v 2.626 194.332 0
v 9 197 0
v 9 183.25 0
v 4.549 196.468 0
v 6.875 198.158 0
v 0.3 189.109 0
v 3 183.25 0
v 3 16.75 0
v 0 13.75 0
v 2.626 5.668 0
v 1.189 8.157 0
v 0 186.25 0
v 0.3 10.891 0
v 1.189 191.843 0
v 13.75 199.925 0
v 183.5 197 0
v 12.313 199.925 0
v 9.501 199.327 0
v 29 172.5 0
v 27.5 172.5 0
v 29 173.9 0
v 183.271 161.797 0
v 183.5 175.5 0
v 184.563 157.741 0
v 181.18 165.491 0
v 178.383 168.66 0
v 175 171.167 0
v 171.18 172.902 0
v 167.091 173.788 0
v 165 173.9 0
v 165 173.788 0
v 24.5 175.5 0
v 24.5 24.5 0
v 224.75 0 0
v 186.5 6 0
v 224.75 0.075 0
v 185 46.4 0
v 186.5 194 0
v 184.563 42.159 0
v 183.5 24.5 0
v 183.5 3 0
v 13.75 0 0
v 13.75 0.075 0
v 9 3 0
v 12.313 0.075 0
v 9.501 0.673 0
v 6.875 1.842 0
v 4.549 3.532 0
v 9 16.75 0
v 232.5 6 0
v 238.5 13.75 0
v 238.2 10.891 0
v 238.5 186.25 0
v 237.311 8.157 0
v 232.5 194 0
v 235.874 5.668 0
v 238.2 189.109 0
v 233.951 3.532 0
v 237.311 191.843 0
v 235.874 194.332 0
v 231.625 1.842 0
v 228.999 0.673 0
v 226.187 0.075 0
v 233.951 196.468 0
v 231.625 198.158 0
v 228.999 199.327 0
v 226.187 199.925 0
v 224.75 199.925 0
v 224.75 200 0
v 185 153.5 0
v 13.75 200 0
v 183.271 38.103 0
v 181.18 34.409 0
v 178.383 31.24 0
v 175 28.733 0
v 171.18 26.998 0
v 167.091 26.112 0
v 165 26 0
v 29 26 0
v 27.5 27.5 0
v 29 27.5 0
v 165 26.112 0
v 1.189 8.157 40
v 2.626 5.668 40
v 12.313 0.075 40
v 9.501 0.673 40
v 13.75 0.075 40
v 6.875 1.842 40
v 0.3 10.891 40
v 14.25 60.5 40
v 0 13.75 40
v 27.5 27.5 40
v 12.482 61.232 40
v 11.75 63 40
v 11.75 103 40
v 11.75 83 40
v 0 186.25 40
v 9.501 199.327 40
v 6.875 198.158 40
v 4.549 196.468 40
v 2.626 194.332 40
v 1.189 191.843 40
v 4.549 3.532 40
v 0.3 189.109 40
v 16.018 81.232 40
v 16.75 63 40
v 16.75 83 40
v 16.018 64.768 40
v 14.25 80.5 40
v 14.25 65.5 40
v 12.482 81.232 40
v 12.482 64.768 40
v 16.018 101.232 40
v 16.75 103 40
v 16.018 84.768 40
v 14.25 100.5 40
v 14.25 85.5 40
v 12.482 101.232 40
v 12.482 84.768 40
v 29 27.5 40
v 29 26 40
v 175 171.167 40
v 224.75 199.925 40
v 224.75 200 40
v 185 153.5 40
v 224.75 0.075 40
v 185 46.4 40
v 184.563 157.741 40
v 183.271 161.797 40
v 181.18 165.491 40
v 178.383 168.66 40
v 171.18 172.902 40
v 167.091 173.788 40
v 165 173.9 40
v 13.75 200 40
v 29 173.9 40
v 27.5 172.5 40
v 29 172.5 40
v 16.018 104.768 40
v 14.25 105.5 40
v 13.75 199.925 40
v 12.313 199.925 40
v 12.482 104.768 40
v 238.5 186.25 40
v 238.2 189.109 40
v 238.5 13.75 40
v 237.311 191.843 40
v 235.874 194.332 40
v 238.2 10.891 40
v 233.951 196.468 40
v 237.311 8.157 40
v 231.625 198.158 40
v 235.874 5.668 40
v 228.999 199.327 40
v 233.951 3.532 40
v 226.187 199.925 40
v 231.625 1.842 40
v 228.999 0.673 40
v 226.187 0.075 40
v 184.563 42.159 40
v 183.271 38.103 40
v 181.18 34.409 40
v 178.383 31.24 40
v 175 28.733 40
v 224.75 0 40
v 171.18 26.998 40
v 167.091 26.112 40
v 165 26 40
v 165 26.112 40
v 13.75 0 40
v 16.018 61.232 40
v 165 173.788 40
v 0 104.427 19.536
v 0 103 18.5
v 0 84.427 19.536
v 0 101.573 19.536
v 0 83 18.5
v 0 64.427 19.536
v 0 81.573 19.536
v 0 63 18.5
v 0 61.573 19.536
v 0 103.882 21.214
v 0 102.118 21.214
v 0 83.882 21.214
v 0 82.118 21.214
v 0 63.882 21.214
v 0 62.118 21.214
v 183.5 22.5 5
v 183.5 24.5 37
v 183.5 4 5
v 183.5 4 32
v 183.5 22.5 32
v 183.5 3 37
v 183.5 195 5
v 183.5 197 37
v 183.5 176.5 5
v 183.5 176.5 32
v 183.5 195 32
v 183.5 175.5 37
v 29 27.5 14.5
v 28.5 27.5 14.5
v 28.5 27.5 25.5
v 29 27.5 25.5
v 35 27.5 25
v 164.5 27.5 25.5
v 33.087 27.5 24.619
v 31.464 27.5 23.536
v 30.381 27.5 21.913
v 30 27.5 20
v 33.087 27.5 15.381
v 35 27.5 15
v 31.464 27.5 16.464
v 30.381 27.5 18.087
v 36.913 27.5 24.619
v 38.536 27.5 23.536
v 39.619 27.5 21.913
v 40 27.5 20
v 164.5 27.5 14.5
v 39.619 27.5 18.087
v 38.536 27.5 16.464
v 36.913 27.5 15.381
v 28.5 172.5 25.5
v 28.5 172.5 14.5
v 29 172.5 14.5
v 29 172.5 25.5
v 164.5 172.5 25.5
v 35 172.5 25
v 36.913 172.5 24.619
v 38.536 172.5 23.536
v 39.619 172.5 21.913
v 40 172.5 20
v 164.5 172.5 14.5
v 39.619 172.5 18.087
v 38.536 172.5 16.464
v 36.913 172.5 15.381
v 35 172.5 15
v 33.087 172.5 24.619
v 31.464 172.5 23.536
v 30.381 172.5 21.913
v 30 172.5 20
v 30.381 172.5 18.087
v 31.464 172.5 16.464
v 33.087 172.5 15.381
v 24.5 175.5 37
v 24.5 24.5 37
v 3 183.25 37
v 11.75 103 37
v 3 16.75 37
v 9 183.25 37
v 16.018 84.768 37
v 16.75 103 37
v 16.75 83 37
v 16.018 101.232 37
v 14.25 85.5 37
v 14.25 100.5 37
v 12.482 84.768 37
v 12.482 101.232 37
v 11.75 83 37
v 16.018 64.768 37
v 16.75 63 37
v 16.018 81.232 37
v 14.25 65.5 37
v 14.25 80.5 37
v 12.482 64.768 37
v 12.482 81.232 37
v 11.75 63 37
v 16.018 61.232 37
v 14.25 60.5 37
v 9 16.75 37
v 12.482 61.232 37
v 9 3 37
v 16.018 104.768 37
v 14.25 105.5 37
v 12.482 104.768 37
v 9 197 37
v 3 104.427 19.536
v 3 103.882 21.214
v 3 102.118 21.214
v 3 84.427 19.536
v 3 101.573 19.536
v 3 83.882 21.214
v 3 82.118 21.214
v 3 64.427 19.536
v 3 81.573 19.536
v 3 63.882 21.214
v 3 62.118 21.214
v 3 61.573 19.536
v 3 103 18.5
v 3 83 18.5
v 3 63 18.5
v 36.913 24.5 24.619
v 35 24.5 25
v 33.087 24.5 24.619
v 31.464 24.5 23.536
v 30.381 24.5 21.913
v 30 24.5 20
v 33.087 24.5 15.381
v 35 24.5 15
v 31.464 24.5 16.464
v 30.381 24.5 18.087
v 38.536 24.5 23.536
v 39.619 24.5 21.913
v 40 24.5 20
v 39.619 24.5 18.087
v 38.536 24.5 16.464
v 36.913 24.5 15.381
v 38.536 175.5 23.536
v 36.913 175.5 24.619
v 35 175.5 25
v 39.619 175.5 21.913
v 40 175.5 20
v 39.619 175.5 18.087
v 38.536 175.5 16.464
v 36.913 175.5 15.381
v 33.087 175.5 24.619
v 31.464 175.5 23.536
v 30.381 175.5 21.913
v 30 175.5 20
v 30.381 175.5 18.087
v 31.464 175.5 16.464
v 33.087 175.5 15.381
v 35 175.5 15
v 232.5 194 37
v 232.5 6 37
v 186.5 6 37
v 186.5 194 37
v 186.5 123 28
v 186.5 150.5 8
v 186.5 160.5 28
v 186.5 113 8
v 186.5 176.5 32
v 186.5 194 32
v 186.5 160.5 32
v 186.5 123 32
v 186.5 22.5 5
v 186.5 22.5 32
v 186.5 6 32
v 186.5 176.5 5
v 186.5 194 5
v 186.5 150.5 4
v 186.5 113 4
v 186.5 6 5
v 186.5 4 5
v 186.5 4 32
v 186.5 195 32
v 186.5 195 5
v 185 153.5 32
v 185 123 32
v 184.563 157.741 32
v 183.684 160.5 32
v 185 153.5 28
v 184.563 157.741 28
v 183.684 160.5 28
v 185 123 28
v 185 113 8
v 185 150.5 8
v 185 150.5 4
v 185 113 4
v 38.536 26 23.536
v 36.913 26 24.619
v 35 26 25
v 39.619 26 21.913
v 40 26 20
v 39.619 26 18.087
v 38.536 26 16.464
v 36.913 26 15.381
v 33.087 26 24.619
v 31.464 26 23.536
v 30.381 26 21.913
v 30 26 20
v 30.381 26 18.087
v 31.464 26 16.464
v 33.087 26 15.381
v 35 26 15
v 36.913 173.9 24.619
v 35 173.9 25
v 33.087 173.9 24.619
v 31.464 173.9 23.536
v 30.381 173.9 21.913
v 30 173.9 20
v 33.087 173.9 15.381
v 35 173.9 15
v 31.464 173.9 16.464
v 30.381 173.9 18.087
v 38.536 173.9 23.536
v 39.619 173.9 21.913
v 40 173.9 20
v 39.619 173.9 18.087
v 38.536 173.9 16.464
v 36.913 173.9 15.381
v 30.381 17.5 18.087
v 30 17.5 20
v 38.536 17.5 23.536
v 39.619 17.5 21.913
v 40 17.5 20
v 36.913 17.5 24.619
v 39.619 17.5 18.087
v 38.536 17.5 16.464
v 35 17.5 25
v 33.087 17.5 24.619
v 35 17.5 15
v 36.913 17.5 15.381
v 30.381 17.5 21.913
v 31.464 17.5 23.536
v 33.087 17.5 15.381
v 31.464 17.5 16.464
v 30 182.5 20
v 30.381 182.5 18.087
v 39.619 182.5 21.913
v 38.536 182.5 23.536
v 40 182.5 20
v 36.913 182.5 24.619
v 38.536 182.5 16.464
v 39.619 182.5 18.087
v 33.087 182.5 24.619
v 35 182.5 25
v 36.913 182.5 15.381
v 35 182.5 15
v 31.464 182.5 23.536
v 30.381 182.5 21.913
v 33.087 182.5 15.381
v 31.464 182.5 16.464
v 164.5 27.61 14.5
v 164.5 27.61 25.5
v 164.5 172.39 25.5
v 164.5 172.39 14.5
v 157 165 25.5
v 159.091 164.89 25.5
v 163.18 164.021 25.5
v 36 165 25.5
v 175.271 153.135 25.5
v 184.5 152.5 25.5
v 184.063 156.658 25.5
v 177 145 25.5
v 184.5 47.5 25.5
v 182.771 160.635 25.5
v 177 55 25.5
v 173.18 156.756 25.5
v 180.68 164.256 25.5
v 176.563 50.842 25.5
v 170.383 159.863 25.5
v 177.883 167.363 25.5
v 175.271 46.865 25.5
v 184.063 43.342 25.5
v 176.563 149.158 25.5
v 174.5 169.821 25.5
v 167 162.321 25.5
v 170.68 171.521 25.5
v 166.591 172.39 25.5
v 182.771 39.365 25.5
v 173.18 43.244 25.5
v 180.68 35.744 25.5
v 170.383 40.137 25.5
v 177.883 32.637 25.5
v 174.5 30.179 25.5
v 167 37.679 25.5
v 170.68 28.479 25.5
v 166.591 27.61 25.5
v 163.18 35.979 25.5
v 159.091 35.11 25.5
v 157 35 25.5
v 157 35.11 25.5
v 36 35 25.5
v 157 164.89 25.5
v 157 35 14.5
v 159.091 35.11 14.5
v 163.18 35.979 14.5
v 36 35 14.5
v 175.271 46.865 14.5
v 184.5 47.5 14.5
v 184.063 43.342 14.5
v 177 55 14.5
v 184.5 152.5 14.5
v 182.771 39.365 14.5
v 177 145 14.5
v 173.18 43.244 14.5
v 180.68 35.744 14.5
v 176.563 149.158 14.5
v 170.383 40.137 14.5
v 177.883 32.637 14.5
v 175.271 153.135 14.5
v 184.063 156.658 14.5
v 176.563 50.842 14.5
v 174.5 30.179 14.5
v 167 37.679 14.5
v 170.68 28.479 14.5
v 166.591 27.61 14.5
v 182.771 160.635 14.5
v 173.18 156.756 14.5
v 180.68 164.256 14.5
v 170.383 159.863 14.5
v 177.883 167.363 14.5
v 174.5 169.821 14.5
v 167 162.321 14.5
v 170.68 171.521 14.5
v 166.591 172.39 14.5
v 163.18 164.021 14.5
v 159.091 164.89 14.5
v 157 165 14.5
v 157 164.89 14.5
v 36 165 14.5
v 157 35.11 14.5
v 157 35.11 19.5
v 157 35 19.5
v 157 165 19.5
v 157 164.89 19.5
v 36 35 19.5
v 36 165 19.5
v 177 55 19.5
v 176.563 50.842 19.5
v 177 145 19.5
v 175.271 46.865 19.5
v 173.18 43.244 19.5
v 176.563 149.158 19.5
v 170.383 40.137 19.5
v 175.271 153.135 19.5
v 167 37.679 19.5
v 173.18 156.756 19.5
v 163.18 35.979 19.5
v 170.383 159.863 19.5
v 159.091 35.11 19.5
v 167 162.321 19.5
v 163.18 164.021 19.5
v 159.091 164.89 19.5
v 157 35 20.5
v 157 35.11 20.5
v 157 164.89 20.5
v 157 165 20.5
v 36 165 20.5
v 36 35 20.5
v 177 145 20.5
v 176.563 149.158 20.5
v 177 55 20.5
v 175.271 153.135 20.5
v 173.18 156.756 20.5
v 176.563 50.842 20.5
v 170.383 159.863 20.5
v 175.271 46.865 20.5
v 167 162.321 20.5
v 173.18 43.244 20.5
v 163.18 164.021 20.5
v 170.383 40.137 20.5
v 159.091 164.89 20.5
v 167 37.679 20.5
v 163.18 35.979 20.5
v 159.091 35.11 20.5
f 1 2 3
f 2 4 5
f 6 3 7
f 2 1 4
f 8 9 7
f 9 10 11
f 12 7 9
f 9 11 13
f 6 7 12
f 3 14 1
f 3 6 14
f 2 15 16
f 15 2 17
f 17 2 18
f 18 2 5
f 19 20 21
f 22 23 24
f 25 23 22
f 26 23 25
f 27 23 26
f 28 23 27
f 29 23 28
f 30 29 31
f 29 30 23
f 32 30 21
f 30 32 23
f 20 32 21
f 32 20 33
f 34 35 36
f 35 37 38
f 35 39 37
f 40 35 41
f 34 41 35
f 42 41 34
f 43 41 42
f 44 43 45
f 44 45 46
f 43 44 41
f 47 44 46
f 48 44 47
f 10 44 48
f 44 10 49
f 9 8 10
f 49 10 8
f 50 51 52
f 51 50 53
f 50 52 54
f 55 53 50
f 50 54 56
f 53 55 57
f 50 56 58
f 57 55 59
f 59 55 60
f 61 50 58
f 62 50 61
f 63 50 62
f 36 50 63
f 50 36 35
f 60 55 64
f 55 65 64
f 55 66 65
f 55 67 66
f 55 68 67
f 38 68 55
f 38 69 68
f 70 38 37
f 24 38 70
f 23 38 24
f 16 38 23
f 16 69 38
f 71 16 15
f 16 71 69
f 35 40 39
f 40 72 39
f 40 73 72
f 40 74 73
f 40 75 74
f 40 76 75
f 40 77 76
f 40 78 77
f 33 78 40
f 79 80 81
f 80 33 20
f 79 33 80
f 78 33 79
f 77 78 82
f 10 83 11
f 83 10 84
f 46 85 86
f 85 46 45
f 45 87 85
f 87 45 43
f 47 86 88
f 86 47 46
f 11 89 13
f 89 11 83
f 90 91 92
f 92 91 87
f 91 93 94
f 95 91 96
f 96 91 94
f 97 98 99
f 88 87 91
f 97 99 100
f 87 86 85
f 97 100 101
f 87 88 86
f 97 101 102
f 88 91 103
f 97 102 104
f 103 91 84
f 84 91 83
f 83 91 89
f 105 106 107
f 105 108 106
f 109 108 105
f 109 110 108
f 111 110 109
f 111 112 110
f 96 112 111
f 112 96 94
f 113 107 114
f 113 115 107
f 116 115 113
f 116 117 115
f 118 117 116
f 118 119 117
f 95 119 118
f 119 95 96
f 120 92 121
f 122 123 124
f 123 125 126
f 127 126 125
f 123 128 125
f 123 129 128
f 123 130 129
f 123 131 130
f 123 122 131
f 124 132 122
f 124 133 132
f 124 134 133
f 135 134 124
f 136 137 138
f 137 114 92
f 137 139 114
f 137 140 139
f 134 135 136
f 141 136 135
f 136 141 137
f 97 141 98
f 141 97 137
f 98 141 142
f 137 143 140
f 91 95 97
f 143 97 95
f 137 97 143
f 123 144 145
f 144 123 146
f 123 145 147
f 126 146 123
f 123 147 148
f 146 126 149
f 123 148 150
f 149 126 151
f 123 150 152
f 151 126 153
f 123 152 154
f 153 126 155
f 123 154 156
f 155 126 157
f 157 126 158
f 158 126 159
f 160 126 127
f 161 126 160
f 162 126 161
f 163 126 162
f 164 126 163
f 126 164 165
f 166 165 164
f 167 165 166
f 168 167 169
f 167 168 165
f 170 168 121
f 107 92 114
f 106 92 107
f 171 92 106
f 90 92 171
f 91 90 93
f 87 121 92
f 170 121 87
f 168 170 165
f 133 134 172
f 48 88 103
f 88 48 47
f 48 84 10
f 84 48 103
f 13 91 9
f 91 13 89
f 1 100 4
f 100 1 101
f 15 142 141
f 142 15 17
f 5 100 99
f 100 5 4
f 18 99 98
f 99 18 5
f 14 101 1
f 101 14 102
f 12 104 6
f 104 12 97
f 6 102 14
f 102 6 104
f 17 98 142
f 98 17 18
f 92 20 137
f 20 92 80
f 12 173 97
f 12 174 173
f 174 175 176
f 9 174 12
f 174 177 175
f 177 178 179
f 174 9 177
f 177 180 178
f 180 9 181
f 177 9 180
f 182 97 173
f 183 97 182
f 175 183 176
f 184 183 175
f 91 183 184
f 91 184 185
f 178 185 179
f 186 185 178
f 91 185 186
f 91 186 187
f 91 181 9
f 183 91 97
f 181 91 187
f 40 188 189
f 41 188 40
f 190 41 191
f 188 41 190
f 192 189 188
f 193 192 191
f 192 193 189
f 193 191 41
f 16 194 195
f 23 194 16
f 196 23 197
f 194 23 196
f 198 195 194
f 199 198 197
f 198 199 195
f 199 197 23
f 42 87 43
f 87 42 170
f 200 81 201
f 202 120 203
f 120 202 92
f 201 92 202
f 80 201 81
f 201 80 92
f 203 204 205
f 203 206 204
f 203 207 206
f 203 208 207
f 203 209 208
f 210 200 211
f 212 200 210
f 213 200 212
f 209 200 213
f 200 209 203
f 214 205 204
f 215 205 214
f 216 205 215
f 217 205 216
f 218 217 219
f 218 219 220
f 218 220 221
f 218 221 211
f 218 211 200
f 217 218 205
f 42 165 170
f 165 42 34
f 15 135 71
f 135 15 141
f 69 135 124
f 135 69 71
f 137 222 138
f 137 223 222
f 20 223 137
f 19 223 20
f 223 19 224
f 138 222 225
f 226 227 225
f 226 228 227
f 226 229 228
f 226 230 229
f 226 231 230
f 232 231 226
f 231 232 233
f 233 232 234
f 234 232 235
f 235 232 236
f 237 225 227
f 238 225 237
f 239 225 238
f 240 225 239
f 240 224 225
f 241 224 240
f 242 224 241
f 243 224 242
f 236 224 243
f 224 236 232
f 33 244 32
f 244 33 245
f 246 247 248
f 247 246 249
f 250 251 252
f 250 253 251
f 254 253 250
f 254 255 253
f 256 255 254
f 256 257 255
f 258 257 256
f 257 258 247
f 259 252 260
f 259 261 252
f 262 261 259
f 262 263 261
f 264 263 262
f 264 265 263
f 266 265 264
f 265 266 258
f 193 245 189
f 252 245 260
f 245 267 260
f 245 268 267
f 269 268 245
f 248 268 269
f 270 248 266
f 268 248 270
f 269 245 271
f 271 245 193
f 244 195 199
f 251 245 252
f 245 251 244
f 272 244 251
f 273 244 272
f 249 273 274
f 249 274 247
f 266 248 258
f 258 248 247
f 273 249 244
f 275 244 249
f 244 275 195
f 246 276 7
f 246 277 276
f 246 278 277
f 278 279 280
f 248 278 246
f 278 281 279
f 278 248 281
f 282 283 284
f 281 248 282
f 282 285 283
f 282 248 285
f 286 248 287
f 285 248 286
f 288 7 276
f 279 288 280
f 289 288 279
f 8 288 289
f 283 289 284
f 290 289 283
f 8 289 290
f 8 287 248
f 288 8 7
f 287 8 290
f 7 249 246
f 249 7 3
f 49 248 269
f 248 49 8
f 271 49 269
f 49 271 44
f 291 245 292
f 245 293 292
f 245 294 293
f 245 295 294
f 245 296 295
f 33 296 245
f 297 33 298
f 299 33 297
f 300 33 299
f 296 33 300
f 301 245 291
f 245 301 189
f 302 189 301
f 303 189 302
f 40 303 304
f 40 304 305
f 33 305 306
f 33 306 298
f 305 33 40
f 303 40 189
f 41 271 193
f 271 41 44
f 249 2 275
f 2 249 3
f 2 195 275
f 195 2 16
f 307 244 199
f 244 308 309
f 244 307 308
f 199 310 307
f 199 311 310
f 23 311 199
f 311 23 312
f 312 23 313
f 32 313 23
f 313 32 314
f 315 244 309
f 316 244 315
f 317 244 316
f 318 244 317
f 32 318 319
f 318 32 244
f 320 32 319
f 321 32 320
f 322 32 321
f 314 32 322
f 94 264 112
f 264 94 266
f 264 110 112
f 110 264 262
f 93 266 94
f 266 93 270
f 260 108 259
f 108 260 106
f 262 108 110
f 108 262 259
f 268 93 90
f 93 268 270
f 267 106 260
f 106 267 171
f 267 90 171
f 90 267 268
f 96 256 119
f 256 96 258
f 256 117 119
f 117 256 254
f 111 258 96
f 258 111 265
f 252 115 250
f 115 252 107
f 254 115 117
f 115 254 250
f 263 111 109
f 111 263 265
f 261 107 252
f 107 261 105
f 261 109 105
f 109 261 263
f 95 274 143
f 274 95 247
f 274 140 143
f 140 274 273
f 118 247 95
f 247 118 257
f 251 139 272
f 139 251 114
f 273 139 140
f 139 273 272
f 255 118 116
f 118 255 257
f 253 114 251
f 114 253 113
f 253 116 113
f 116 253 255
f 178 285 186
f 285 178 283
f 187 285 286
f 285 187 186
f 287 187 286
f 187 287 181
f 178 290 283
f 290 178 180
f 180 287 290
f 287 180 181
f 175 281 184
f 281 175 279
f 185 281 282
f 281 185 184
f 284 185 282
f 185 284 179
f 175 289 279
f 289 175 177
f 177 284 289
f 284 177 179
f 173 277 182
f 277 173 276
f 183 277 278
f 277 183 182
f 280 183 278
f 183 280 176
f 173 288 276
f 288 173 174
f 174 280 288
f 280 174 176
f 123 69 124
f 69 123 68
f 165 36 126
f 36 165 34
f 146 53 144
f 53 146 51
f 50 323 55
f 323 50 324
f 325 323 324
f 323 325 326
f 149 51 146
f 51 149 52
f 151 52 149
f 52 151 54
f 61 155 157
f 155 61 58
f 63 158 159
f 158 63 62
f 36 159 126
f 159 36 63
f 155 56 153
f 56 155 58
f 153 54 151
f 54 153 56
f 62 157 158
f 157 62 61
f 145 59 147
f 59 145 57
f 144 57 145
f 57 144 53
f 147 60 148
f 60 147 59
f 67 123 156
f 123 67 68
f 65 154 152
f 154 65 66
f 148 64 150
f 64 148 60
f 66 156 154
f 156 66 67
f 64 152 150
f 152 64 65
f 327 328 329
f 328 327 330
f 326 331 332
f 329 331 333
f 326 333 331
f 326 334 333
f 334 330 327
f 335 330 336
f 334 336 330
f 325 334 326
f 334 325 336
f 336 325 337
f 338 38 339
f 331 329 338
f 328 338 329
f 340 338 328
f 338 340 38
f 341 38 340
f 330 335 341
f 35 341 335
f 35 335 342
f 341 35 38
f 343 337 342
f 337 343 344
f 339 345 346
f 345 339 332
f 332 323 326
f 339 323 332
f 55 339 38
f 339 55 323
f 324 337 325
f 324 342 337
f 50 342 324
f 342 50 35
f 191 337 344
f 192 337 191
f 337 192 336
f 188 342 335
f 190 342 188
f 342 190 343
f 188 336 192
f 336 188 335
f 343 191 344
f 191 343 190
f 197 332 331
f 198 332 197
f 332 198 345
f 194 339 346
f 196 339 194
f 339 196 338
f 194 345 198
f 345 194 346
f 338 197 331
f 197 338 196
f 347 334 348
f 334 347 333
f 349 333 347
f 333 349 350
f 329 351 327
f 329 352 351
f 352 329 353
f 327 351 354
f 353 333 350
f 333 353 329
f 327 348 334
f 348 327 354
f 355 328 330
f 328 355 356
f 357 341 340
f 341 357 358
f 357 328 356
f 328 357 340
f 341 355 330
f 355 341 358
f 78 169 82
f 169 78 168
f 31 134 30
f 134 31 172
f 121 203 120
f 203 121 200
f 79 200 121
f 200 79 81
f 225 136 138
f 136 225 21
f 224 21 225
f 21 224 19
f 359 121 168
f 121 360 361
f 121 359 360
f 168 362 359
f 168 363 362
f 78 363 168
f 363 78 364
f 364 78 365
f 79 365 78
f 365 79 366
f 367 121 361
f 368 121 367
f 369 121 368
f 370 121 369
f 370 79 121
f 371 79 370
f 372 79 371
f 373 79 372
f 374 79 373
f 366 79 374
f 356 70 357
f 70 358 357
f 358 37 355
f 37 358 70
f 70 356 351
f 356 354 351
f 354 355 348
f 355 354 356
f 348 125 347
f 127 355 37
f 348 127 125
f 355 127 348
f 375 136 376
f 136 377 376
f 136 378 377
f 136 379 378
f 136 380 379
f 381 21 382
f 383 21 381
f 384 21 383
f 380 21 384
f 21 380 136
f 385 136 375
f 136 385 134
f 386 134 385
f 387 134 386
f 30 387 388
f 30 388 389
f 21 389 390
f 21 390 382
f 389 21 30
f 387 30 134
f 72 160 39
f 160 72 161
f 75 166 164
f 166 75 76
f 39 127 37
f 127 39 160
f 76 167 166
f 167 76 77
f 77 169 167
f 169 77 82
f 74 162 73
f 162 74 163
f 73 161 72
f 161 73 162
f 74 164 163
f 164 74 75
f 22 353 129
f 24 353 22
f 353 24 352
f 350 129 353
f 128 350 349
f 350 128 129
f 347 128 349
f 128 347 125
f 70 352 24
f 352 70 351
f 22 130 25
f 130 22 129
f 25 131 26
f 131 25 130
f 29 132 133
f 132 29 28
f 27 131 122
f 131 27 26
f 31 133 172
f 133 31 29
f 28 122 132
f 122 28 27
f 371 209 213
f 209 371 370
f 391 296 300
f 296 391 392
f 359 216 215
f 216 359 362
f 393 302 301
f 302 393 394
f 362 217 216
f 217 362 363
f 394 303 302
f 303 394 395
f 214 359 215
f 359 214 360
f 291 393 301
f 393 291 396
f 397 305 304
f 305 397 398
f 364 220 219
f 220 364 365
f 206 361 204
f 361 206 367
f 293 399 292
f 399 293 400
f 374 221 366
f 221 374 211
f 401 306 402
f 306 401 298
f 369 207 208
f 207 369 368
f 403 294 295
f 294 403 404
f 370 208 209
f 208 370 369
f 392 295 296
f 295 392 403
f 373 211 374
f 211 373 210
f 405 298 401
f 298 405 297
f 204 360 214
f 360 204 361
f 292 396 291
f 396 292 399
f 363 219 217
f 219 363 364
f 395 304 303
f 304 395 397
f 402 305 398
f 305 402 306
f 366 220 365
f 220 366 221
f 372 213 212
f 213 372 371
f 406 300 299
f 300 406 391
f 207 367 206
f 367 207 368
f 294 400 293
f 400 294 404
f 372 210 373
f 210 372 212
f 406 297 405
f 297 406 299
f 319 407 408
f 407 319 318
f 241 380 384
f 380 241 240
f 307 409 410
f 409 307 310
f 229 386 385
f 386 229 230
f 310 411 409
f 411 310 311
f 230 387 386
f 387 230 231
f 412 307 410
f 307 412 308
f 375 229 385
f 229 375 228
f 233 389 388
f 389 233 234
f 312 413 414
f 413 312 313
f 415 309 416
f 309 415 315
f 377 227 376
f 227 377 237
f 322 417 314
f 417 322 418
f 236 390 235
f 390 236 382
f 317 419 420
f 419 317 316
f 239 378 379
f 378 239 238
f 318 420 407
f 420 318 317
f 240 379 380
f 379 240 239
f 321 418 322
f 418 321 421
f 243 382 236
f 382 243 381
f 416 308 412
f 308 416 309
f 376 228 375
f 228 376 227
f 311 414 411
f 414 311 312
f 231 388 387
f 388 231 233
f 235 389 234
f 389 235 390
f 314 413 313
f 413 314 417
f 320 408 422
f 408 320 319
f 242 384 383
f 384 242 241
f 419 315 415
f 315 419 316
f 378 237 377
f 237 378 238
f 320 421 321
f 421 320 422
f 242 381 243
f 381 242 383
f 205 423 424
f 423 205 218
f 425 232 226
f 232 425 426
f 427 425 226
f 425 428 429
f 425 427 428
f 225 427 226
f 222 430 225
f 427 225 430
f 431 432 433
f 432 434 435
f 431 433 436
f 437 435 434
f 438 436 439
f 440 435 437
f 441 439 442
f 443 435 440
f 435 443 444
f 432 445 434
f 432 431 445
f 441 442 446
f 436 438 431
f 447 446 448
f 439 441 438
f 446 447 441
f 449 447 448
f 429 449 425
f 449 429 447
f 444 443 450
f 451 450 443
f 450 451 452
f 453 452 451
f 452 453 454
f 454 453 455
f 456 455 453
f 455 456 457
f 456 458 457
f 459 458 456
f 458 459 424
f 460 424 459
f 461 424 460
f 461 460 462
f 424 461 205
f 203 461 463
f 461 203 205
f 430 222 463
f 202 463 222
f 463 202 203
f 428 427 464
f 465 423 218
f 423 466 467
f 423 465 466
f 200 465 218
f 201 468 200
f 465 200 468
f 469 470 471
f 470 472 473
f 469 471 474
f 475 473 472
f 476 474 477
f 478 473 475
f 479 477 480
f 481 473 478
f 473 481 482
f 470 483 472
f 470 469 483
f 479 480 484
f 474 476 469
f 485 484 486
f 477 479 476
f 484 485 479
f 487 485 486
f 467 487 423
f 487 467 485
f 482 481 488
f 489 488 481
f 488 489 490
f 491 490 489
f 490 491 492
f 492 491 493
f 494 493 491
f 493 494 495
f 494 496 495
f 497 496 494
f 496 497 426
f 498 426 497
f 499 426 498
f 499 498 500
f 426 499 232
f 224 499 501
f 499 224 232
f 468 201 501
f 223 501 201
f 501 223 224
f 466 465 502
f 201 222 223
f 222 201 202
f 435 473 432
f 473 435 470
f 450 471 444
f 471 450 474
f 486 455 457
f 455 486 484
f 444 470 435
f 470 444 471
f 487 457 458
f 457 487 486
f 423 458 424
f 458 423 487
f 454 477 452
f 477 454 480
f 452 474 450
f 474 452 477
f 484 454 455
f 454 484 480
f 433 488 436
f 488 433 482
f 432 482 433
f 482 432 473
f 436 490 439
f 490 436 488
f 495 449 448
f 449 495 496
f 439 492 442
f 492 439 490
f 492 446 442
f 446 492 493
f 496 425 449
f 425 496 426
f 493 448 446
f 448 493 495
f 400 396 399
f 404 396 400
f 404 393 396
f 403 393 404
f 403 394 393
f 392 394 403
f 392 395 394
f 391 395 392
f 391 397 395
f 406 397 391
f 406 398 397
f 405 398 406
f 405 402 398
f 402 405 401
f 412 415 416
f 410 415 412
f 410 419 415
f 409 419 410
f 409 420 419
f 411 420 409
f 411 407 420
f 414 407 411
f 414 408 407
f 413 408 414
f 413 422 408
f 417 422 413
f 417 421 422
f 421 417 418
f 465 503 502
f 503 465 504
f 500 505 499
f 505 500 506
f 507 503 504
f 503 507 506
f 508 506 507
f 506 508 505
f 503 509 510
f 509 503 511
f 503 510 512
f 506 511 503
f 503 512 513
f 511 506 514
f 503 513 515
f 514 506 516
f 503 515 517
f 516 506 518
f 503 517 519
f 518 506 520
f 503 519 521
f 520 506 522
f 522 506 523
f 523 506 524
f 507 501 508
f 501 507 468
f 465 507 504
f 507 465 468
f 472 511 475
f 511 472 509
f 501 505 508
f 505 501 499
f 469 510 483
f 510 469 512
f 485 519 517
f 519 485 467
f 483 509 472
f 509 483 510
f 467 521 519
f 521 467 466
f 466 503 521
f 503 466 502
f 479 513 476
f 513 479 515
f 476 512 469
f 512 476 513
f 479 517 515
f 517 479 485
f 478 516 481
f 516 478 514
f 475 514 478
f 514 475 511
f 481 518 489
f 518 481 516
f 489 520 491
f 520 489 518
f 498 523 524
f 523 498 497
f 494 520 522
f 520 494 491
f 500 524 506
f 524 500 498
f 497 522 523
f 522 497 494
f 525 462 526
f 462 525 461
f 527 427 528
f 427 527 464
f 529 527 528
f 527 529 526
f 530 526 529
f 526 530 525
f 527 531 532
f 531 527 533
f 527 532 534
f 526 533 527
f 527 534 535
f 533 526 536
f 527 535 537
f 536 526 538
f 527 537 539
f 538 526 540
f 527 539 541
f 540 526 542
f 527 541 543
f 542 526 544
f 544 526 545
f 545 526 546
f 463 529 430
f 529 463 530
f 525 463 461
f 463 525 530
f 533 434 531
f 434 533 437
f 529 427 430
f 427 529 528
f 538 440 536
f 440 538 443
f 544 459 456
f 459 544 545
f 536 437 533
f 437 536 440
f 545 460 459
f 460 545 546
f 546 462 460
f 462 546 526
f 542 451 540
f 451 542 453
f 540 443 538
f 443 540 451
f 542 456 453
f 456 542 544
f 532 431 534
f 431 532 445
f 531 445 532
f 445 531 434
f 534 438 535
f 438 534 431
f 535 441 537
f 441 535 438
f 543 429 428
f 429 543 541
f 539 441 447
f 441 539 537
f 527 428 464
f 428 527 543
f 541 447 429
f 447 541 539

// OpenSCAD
// file: flap.scad
/*
flapBreite  = 145;      // Breite der Klappe
flapHoehe   = 155;      // Höhe der Klapppe

flapStaerke = 9;       // Dicke der Klappe
flapFrame   = 15;       // Randstärke der Klappe
flapHub     = 5;        // Tiefe der Klappensenkung (beidseitig)
*/

module flap(flapBreite,flapHoehe,flapStaerke) {
    Zapfenlaenge = 10;      // Länge der Aufhängezapfen
    Zapfenradius = 5;       // Radius der Aufhängezapfen
    Zapfenoffset = 1;       // von Oberkante versetzt

    flapCore(flapBreite,flapHoehe,flapStaerke);

    // Aufhängung links
    translate([flapStaerke/2+Zapfenoffset,0,flapStaerke/2])
    rotate([90,0,0])
    cylinder(Zapfenlaenge,r=Zapfenradius, false);

    // Aufhängung rechts
    translate([flapStaerke/2+Zapfenoffset,flapBreite+Zapfenlaenge,flapStaerke/2])
    rotate([90,0,0])
    cylinder(Zapfenlaenge,r=Zapfenradius, false);

}


module flapCore(flapBreite,flapHoehe,flapStaerke) {
    Rundung = 20;

    // Klappe
    translate([0,0,0])
    cube([flapHoehe-Rundung,flapBreite-Rundung,flapStaerke]);
    // Klappe Ergänzung unten
    translate([flapHoehe-Rundung,Rundung,0])
    cube([Rundung,flapBreite-2*Rundung,flapStaerke]);

    // Klappe Ergänzung rechts
    translate([0,flapBreite-Rundung,0])
    cube([flapHoehe-Rundung,Rundung,flapStaerke]);
    
    // Rundung unten links
    translate([flapHoehe-Rundung,Rundung,0])
    cylinder(flapStaerke,r=Rundung, false);
    
    // Rundung unten rechts
    translate([flapHoehe-Rundung,flapBreite-Rundung,0])
    cylinder(flapStaerke,r=Rundung, false);

}
/*
difference(){
    flap(flapBreite,flapHoehe,flapStaerke);
    translate([flapFrame/2,flapFrame/2,0])
    flapCore(flapBreite-flapFrame,flapHoehe-flapFrame,flapHub);
    translate([flapFrame/2,flapFrame/2,flapStaerke-flapHub])
    flapCore(flapBreite-flapFrame,flapHoehe-flapFrame,flapHub);
}
*/
// main file
include <flap.scad>;



// Flap Einstellungen

flapBreite  = 145;
flapHoehe   = 156;
flapStaerke = 11;       // Dicke der Klappe
flapFrame   = 15;       // Randstärke der Klappe
flapHub     = 5;        // Tiefe der Klappeneinprägung (beidseitig)

// Fronteinstellungen

frontDicke   = 40;
frontRahmen  = 27.5;
frontWandstaerke = 3.0;  // Dicke des Gehäuse
frontboxHoehe       = 55;
frontBreite         = flapBreite+frontRahmen*2;            // echte frontBreite
frontHoehe          = flapHoehe+frontRahmen+frontboxHoehe;  // echte frontHoehe
frontboxBreite      = frontBreite;


echo("frontBreite = ",frontBreite);
echo("frontHöhe = ",frontHoehe);

module vollFront() {
    //Ecke links oben
    translate([frontRahmen/2,frontRahmen/2,0])
    cylinder(frontDicke,r=frontRahmen/2, false);
    //Ecke rechts oben
    translate([(frontRahmen/2),frontBreite-frontRahmen/2,0])
    cylinder(frontDicke,r=frontRahmen/2, false);
    //Seite oben
    translate([0,frontRahmen/2,0])
    cube([frontRahmen,frontBreite-frontRahmen,frontDicke]);
    //Seite links
    translate([frontRahmen/2,0,0])
    cube([flapHoehe+frontRahmen/2,frontRahmen,frontDicke]);
    //Seite rechts
    translate([frontRahmen/2,frontBreite-frontRahmen,0])
    cube([flapHoehe+frontRahmen/2,frontRahmen,frontDicke]);
    //Seite unten
    translate([flapHoehe,frontRahmen,0])
    cube([frontRahmen,flapBreite,frontDicke]);

}

module hohlFront() {

    LEDradius       =   2.5;
    Tasterradius    =   1.5;

    // Seite oben
    translate([0,frontRahmen/2,0])
    cube([frontRahmen-frontWandstaerke*2,frontBreite-frontRahmen-frontWandstaerke*2,frontDicke-frontWandstaerke]);
    // Seite links
    translate([frontWandstaerke*2,0,0])
    cube([flapHoehe+frontRahmen,frontRahmen-frontWandstaerke*2,frontDicke-frontWandstaerke]);
    // Seite rechts
    translate([frontWandstaerke*2,frontBreite-frontRahmen,0])
    cube([flapHoehe+frontRahmen,frontRahmen-frontWandstaerke*2,frontDicke-frontWandstaerke]);
   
    // LED Löcher
    rotate([0,0,90])
    translate([60,-frontRahmen/2+LEDradius,frontDicke-frontWandstaerke])
    cylinder(frontWandstaerke*2,r=LEDradius,false);
    rotate([0,0,90])
    translate([80,-frontRahmen/2+LEDradius,frontDicke-frontWandstaerke])
    cylinder(frontWandstaerke*2,r=LEDradius,false);
    rotate([0,0,90])
    translate([100,-frontRahmen/2+LEDradius,frontDicke-frontWandstaerke])
    cylinder(frontWandstaerke*2,r=LEDradius,false);

    // Tasten Löcher
    rotate([0,90,0])
    translate([-frontDicke/2,60,-5])
    cylinder(frontWandstaerke*2,r=Tasterradius, false);
    rotate([0,90,0])
    translate([-frontDicke/2,80,-5])
    cylinder(frontWandstaerke*2,r=Tasterradius, false);
    rotate([0,90,0])
    translate([-frontDicke/2,100,-5])
    cylinder(frontWandstaerke*2,r=Tasterradius, false);
}

module vollBox() {
    // Box oberer Teil
    translate([0,0,0])
    cube([frontboxHoehe-frontRahmen/2,frontboxBreite,frontDicke]);
    // Boxboden
    translate([frontboxHoehe-frontWandstaerke*2,frontRahmen/2,0])
    cube([frontWandstaerke*2,frontboxBreite-frontRahmen,frontDicke]);
    // Boxrückwand
    translate([frontboxHoehe-frontRahmen,frontRahmen/2,frontDicke-frontWandstaerke])
    cube([frontRahmen,frontboxBreite-frontRahmen,frontWandstaerke]);
    
    //Ecke links unten
    translate([frontboxHoehe-frontRahmen/2,frontRahmen/2,0])
    cylinder(frontDicke,r=frontRahmen/2, false);
    //Ecke rechts unten
    translate([frontboxHoehe-frontRahmen/2,frontBreite-frontRahmen/2,0])
    cylinder(frontDicke,r=frontRahmen/2, false);
}

module hohlBox() {
    // Boxaushöhlung
    translate([0,frontWandstaerke*2])
    cube([frontboxHoehe-frontWandstaerke*3,frontBreite-frontWandstaerke*4,frontDicke-frontWandstaerke]);
    
    // Schlitz Durchbruch links
    translate([-frontWandstaerke,frontWandstaerke+1,5])
    cube([frontWandstaerke,frontRahmen-frontWandstaerke*3,frontDicke-frontWandstaerke-10]);

    // Schlitz Durchbruch rechts
    translate([-frontWandstaerke,frontWandstaerke+flapBreite+frontRahmen+1,5])
    cube([frontWandstaerke,frontRahmen-frontWandstaerke*3,frontDicke-frontWandstaerke-10]);

    // Schlitz für Verschluss vorne
    translate([-frontWandstaerke,frontWandstaerke+flapBreite-25,28])
    cube([frontWandstaerke,frontRahmen+10,4]);

    // Schlitz für Verschluss hinten
    translate([-frontWandstaerke,frontWandstaerke+flapBreite-35,4])
    cube([frontWandstaerke,frontRahmen+10,4]);
}

module front() {
    difference() {
        
        // Front-Oben
        vollFront();
        translate([frontWandstaerke,frontWandstaerke,0])
        hohlFront();
    }
    
    // Front-Unten (GearBox)
    translate([frontHoehe-frontboxHoehe,0,0])
    difference() {
        vollBox();
        translate([frontWandstaerke,0,0])
        hohlBox();
    } 
}

difference() {
    
    // gesamte Front 2-teilig oben/unten
    front();
    
    // Klappe vergrößert ausschneiden
    translate([frontRahmen+1.5,frontRahmen-1.5,0])
    scale([1.00,1.02,1.0])flapCore(flapBreite,flapHoehe,frontDicke);
    
    // Klappe Original ausschneiden (wg. Aufhängung)
    translate([frontRahmen+1,frontRahmen,frontDicke/2-flapStaerke/2])
    flap(flapBreite,flapHoehe,flapStaerke);

}




// Flap in Front einpassen
translate([frontRahmen+1,frontRahmen,frontDicke/2-flapStaerke/2])
difference(){
    flap(flapBreite,flapHoehe,flapStaerke);
    translate([flapFrame/2,flapFrame/2,0])
    flapCore(flapBreite-flapFrame,flapHoehe-flapFrame,flapHub);
    translate([flapFrame/2,flapFrame/2,flapStaerke-flapHub])
    flapCore(flapBreite-flapFrame,flapHoehe-flapFrame,flapHub);
}
/**/
